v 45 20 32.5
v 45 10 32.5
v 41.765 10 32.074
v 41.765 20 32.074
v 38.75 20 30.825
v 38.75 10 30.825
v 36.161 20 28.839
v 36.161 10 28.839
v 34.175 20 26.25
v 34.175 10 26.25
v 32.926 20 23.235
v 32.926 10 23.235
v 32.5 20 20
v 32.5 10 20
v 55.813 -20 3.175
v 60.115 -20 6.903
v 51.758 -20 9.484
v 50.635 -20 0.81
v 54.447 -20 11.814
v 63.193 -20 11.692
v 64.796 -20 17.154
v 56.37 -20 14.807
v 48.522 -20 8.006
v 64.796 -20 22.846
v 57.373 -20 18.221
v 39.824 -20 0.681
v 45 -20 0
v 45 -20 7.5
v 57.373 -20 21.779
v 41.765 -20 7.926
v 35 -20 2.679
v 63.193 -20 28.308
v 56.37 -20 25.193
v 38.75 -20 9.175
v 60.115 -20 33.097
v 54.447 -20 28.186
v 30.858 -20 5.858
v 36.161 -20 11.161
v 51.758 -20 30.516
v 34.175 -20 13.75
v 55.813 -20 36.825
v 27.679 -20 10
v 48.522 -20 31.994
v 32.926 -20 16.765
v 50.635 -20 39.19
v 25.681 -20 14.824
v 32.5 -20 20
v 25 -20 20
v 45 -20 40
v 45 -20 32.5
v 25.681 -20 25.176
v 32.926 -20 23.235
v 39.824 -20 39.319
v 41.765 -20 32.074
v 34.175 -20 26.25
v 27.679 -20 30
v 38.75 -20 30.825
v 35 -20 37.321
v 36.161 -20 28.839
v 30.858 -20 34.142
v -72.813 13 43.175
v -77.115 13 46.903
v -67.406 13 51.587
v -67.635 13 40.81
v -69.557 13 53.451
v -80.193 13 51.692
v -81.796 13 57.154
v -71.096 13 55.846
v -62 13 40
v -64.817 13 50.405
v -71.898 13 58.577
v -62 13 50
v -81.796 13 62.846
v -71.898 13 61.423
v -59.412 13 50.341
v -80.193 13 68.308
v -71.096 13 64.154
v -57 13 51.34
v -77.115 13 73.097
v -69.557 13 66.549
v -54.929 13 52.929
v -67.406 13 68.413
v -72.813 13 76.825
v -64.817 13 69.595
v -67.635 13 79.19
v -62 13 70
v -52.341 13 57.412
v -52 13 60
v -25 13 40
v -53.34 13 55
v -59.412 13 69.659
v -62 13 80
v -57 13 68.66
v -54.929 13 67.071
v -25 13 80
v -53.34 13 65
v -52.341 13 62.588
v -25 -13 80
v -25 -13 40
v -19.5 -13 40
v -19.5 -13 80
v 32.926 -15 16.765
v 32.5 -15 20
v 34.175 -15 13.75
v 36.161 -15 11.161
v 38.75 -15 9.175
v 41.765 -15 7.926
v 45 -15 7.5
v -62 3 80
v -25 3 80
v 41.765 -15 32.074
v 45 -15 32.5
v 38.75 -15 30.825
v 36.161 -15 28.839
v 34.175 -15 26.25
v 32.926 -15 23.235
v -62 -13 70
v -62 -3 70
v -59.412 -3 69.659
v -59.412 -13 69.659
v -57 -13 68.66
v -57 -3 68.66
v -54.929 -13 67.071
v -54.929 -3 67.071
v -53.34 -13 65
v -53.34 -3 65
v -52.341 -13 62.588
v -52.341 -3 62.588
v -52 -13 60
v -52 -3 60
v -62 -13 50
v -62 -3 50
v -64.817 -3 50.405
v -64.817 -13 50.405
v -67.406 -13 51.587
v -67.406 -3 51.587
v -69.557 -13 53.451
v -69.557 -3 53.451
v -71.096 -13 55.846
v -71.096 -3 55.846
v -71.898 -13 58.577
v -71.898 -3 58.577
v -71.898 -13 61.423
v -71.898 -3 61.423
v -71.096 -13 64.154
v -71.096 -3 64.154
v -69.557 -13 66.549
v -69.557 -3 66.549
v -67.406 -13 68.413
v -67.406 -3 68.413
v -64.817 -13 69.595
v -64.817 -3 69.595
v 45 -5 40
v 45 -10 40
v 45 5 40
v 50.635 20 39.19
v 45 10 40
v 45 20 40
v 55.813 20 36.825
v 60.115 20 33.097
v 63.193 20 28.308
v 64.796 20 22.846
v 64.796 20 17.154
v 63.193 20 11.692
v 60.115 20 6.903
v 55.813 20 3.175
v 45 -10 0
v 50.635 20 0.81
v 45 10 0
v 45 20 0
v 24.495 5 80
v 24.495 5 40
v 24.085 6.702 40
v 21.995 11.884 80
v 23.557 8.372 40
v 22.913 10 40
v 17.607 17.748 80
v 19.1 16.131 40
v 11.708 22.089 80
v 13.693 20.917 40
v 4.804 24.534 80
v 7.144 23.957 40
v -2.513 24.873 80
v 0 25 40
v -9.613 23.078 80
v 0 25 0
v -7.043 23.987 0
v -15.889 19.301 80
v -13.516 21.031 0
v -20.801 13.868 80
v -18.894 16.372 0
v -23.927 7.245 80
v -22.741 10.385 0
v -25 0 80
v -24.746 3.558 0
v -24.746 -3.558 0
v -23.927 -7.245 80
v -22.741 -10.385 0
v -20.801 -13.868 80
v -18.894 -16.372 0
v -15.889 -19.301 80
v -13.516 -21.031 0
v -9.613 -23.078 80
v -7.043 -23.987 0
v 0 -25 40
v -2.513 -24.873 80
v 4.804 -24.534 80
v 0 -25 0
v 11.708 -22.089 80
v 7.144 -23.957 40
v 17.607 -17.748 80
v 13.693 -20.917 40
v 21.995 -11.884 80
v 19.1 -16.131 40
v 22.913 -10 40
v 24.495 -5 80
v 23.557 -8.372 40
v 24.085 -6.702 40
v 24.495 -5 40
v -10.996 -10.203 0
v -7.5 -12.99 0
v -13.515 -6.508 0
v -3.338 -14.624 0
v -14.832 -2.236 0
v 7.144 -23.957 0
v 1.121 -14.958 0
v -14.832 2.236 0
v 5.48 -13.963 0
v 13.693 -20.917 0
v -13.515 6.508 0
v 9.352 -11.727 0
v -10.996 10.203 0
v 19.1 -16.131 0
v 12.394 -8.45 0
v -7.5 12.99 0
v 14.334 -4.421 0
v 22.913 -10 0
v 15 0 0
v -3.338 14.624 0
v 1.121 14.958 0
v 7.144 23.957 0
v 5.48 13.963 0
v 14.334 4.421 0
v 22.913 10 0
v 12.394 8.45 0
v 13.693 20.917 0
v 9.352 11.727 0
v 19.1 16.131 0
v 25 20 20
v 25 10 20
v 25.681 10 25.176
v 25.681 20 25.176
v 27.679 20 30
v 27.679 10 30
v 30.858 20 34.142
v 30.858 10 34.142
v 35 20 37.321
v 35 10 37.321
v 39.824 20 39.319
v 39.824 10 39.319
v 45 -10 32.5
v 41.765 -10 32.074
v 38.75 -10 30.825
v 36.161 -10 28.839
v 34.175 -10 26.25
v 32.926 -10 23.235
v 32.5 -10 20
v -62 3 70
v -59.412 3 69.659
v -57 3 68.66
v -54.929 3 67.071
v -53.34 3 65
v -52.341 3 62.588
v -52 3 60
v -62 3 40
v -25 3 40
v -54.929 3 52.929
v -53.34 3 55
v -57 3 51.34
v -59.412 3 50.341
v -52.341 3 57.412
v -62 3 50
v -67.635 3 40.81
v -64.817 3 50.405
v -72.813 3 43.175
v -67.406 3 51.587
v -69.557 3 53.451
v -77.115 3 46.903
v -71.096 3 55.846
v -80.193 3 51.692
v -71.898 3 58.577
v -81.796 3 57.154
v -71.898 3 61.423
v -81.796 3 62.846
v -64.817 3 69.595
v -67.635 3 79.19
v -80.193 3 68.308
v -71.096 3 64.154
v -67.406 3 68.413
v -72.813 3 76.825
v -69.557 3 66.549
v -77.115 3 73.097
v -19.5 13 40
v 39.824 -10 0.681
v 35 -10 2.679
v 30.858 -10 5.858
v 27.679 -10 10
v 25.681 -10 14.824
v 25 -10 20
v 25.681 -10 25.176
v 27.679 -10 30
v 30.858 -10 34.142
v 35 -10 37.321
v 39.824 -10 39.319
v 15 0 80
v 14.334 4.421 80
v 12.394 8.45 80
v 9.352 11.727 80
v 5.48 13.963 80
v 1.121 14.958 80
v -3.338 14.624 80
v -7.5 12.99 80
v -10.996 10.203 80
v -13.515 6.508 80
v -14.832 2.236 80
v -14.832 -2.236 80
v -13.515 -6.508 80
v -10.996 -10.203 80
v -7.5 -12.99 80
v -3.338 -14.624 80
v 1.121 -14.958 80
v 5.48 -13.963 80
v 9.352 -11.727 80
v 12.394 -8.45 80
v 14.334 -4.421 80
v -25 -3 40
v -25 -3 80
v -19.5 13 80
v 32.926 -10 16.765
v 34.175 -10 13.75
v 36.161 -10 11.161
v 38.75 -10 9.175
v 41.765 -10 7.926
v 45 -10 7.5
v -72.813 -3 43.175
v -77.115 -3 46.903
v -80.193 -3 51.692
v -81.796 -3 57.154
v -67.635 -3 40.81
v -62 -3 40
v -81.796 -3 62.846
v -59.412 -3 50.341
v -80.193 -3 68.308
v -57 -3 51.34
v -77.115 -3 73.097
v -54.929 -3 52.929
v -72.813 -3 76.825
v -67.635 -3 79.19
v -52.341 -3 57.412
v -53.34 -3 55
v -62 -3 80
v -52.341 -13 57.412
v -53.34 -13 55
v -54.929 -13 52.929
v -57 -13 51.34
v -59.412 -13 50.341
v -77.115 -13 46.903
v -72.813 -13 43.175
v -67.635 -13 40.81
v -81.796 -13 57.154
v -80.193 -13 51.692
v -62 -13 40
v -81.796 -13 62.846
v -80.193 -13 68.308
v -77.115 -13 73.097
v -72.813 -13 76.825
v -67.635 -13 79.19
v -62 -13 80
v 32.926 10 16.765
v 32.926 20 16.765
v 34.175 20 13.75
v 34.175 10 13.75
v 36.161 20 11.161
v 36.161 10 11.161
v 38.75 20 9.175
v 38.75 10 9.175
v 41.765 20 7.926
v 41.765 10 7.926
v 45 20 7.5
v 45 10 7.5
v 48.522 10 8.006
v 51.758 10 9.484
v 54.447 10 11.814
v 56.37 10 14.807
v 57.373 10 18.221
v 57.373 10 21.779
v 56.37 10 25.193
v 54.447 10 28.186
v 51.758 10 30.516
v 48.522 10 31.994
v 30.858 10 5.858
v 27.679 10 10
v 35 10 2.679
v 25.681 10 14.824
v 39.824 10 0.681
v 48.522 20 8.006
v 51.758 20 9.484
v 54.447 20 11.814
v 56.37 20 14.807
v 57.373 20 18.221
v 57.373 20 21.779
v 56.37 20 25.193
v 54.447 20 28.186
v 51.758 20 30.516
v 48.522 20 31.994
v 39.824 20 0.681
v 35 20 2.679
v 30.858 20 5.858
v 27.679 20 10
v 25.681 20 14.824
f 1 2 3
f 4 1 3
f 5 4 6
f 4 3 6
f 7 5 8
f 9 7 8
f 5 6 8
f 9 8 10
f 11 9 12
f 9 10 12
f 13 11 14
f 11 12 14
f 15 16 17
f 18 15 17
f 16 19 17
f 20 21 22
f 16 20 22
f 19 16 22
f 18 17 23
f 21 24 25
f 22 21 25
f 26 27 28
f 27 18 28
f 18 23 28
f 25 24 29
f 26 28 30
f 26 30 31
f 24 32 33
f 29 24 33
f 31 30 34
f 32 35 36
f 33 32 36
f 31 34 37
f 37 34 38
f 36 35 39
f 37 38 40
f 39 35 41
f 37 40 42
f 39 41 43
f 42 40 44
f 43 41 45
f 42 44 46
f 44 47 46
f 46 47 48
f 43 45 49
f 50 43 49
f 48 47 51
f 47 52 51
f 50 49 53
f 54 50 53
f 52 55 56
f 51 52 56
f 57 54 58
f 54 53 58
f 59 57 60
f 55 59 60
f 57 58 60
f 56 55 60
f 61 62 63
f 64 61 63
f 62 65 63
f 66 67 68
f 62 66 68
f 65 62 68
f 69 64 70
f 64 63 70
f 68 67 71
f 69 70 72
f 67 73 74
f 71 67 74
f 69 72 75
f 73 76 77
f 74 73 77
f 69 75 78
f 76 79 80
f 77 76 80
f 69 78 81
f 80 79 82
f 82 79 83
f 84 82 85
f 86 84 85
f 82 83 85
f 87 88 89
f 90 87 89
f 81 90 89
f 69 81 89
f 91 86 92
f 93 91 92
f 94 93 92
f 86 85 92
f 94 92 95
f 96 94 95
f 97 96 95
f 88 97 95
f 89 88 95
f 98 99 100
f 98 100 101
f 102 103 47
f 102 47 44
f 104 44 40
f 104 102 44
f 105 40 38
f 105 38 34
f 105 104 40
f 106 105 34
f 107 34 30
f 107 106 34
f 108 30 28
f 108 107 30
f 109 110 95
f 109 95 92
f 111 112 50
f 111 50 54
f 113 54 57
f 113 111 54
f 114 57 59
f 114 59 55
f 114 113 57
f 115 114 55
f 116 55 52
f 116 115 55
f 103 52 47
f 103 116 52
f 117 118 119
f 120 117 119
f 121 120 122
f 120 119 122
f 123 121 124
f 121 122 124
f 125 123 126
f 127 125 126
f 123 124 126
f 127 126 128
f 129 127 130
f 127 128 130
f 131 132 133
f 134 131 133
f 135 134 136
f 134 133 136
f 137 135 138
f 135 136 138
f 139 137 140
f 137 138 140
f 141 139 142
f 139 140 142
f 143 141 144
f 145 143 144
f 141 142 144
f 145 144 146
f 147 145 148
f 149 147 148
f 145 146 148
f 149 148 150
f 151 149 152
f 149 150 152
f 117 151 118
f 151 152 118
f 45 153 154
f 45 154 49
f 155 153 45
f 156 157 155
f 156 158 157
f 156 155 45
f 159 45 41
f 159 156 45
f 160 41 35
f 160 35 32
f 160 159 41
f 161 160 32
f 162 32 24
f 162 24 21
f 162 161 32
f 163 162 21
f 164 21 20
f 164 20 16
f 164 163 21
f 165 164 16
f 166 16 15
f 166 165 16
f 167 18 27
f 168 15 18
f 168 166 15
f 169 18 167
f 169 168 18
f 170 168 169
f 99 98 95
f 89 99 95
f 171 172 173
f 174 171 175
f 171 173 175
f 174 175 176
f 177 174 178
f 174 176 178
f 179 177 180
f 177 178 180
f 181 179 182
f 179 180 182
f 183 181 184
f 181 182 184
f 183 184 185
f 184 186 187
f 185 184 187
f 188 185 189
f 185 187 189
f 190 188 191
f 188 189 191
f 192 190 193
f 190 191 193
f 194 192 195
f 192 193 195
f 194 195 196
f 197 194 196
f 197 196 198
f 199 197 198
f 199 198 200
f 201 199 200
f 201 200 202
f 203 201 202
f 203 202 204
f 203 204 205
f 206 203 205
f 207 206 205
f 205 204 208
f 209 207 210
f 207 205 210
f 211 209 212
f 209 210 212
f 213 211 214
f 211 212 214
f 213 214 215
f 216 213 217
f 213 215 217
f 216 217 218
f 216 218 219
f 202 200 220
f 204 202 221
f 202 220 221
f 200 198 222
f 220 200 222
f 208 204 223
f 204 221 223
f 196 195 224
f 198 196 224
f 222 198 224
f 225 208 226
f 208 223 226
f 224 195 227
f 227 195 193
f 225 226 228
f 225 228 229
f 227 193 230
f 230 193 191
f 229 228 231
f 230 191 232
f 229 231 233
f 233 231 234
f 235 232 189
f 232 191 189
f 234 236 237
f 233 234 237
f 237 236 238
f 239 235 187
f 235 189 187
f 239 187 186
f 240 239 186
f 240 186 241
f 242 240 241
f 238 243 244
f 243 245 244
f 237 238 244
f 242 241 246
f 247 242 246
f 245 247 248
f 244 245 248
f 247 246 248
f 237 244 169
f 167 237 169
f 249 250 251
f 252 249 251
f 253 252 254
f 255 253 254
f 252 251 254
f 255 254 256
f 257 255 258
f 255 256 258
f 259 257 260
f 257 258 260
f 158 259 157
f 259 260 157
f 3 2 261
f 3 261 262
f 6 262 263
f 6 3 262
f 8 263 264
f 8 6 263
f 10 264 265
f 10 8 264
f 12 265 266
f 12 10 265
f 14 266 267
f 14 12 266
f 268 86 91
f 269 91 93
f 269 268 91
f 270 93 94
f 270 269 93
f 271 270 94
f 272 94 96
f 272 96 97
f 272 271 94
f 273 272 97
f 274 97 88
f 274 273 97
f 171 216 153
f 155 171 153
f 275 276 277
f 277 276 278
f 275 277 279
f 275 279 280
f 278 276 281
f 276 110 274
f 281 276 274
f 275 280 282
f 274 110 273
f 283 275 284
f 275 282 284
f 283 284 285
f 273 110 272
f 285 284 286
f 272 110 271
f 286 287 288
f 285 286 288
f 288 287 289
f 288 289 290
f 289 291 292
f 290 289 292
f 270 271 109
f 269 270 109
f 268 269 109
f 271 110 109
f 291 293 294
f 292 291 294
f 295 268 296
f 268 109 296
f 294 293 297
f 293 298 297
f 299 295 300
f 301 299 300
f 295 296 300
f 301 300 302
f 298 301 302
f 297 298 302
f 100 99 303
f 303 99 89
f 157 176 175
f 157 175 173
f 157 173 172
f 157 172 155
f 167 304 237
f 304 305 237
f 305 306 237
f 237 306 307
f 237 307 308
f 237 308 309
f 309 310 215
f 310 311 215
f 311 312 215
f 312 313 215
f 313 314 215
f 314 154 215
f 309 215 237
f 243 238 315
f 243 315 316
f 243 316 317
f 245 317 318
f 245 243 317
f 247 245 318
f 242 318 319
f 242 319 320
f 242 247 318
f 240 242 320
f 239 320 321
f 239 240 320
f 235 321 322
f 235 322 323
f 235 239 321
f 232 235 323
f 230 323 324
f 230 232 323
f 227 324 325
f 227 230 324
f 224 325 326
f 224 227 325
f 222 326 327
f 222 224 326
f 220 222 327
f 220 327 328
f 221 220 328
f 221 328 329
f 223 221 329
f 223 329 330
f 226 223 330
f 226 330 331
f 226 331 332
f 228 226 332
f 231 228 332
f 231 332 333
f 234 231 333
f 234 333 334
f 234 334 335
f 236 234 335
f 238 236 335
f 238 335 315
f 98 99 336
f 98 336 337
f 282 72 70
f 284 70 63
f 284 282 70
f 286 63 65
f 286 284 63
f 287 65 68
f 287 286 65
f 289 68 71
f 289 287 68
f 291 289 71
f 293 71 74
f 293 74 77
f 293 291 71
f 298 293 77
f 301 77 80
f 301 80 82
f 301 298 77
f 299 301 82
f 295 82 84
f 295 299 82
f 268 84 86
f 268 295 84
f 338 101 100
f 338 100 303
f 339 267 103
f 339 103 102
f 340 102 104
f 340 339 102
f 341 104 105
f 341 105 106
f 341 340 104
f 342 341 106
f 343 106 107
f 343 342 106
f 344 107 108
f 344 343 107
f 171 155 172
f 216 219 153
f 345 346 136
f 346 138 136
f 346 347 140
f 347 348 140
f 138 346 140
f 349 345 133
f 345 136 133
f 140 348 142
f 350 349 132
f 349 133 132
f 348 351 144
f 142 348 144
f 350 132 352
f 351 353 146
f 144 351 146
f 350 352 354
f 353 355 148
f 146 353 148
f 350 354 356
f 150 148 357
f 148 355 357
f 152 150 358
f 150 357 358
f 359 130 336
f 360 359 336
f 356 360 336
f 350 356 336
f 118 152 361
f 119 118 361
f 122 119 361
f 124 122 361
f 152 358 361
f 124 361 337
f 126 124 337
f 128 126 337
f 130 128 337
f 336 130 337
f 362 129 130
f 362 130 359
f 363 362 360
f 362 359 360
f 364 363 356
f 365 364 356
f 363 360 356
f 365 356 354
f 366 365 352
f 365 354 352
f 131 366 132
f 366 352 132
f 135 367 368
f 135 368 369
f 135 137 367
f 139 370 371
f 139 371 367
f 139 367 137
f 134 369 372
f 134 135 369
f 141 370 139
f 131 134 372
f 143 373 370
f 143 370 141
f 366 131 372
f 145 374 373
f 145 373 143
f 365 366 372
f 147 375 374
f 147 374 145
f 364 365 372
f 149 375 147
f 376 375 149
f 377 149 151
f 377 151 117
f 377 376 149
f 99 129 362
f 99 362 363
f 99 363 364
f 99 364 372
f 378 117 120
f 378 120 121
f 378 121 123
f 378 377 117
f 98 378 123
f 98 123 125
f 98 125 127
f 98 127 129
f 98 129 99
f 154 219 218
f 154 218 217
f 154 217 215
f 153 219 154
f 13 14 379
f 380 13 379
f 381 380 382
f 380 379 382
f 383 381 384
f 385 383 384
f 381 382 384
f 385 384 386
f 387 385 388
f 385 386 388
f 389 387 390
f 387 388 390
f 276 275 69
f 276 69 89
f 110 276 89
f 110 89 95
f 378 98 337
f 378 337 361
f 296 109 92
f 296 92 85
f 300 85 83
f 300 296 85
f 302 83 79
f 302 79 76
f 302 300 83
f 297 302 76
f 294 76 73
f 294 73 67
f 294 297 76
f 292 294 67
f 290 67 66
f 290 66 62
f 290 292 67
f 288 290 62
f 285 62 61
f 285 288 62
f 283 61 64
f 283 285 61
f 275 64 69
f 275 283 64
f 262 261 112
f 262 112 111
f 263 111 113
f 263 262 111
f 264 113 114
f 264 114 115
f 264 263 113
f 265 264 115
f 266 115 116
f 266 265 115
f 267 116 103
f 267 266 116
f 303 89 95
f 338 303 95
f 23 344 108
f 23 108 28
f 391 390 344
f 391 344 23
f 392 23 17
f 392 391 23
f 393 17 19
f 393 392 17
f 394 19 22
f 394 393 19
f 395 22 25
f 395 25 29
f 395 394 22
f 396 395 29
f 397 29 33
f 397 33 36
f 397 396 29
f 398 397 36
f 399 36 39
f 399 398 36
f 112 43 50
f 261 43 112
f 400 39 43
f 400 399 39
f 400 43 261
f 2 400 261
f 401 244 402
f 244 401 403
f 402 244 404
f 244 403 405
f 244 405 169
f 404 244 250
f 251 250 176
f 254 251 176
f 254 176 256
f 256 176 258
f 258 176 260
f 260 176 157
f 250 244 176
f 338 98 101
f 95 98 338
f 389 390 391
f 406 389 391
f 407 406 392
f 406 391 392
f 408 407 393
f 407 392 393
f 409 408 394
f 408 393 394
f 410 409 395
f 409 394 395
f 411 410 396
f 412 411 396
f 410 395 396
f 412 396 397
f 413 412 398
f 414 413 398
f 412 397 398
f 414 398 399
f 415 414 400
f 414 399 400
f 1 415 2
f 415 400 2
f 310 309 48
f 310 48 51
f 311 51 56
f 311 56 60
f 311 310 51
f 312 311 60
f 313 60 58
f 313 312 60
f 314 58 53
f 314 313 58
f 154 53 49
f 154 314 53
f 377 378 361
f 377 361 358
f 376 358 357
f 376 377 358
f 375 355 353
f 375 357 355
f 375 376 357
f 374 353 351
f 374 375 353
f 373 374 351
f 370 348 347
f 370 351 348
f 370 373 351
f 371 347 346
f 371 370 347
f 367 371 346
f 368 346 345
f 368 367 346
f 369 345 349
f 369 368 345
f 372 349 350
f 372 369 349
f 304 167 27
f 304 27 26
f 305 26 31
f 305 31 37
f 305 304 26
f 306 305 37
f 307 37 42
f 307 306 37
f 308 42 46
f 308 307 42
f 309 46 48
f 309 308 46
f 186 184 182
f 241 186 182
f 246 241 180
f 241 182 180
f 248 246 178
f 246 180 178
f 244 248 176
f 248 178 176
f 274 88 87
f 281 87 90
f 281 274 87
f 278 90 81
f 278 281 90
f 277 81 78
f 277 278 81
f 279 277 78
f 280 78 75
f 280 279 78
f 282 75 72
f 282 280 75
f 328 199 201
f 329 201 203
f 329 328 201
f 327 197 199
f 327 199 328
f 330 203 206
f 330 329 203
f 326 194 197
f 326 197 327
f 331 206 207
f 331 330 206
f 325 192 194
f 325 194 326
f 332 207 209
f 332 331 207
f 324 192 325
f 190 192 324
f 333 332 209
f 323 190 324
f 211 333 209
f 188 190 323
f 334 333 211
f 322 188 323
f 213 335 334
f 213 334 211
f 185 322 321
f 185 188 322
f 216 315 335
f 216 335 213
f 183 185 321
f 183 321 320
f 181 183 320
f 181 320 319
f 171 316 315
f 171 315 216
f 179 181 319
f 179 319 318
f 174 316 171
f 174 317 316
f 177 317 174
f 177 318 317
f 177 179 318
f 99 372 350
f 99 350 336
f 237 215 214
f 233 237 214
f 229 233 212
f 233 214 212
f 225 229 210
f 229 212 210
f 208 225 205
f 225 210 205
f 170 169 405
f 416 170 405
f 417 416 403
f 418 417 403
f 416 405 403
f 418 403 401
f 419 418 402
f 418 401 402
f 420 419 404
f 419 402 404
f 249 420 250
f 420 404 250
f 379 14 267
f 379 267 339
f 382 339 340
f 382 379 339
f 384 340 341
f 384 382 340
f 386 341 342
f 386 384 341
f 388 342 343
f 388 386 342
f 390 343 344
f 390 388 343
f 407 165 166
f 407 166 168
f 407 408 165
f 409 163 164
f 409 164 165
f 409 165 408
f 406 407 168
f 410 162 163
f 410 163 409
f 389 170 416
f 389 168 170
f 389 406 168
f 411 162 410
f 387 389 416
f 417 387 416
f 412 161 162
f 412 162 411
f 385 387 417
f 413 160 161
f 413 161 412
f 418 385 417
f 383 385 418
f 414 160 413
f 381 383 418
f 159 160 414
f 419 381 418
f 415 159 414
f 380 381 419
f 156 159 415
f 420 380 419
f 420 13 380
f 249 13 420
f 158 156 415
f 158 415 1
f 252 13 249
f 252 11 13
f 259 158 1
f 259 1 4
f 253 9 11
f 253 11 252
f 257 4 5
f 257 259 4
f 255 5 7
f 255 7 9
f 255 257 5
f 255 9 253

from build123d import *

# Parameters (mm, degrees)
F0_R           = 25
F0_R_2         = 15
F1_DEPTH       = 80
F4_DEPTH       = 40
F6_DEPTH       = 25
F7_R           = 15
F8_DEPTH       = 40
F10_DEPTH      = 49.5
F12_DEPTH      = 10
F12_DEPTH_BACK = 30
F13_DEPTH      = 25
F17_DEPTH      = 13
F17_DEPTH_BACK = 13
F18_W          = 26
F18_H          = 40
F19_DEPTH      = 5.5
F20_W          = 37
F20_H          = 3
F21_DEPTH      = 156.4


with BuildPart() as f1:
    # F0 (on Top) → F1 (new body)
    with BuildSketch(Plane.XY):
        Circle(F0_R)
        Circle(F0_R_2, mode=Mode.SUBTRACT)
    extrude(amount=F1_DEPTH)

    # F3 (on face) → F4 (join)
    with BuildSketch(Plane.XY.offset(80)):
        with BuildLine():
            ThreePointArc((24.4948974278, 5), (24.8734038251, 2.5127240501), (25, 0))
            Line((25, 0), (45, 0))
            Line((45, 0), (45, 5))
            Line((45, 5), (24.4948974278, 5))
        make_face()
        with BuildLine():
            Line((45, 0), (25, 0))
            ThreePointArc((25, 0), (24.8734038251, -2.5127240501), (24.4948974278, -5))
            Line((24.4948974278, -5), (45, -5))
            Line((45, -5), (45, 0))
        make_face()
    extrude(amount=-F4_DEPTH)

    # F5 (on face) → F6 (cut)
    with BuildSketch(Plane.XZ.offset(5)):
        Polygon((45, 80), (24.4948974278, 80), (45, 40), align=None)
    extrude(amount=-F6_DEPTH, mode=Mode.SUBTRACT)

    # F7 (on Top) → F8 (join)
    with BuildSketch(Plane.XY):
        with BuildLine():
            ThreePointArc((0, -25), (17.6776695297, -17.6776695297), (25, 0))
            ThreePointArc((25, 0), (17.6776695297, 17.6776695297), (0, 25))
            ThreePointArc((0, 25), (-25, 0), (0, -25))
        make_face()
        Circle(F7_R, mode=Mode.SUBTRACT)
        with BuildLine():
            ThreePointArc((0, 25), (17.6776695297, 17.6776695297), (25, 0))
            ThreePointArc((25, 0), (17.6776695297, -17.6776695297), (0, -25))
            Line((0, -25), (57, -25))
            Line((57, -25), (57, 25))
            Line((57, 25), (0, 25))
        make_face()
    extrude(amount=F8_DEPTH)

    # F9 (on face) → F10 (cut)
    with BuildSketch(Plane.XY.offset(40)):
        with BuildLine():
            Line((45, 5), (45, 0))
            Line((45, 0), (45, -5))
            Line((45, -5), (45, -10))
            Line((45, -10), (22.9128784748, -10))
            ThreePointArc((22.9128784748, -10), (13.6930639376, -20.9165006634), (0, -25))
            Line((0, -25), (57, -25))
            Line((57, -25), (57, 25))
            Line((57, 25), (0, 25))
            ThreePointArc((0, 25), (13.6930639376, 20.9165006634), (22.9128784748, 10))
            Line((22.9128784748, 10), (24.4948974278, 10))
            Line((24.4948974278, 10), (45, 10))
            Line((45, 10), (45, 5))
        make_face()
    extrude(amount=-F10_DEPTH, mode=Mode.SUBTRACT)

    # F11 (on face) → F12 (join, two sides)
    with BuildSketch(Plane(origin=(0, 10, 0), x_dir=(-1, 0, 0), z_dir=(0, 1, 0))) as f12_sk:
        with BuildLine():
            ThreePointArc((-45, 0), (-30.8578643763, 5.8578643763), (-25, 20))
            ThreePointArc((-25, 20), (-30.8578643763, 34.1421356237), (-45, 40))
            Line((-45, 40), (-45, 32.5))
            ThreePointArc((-45, 32.5), (-36.1611652352, 28.8388347648), (-32.5, 20))
            ThreePointArc((-32.5, 20), (-36.1611652352, 11.1611652352), (-45, 7.5))
            Line((-45, 7.5), (-45, 0))
        make_face()
        with BuildLine():
            Line((-45, 32.5), (-45, 40))
            ThreePointArc((-45, 40), (-65, 20), (-45, 0))
            Line((-45, 0), (-45, 7.5))
            ThreePointArc((-45, 7.5), (-57.5, 20), (-45, 32.5))
        make_face()
    extrude(amount=F12_DEPTH)
    extrude(f12_sk.sketch, amount=-F12_DEPTH_BACK)

    # F13 (cut): a face of the model
    f13_faces = [f1.faces().sort_by_distance(p)[0] for p in [
        (39.6948352303, 10, 20),
    ]]
    extrude(f13_faces, amount=-F13_DEPTH, mode=Mode.SUBTRACT)


with BuildPart() as f17:
    # F16 (on Front) → F17 (new body, two sides)
    with BuildSketch(Plane.XZ) as f17_sk:
        with BuildLine():
            Line((-25, 40), (-25, 80))
            Line((-25, 80), (-62, 80))
            ThreePointArc((-62, 80), (-47.8578643763, 74.1421356237), (-42, 60))
            ThreePointArc((-42, 60), (-47.8578643763, 45.8578643763), (-62, 40))
            Line((-62, 40), (-25, 40))
        make_face()
        with BuildLine():
            ThreePointArc((-42, 60), (-47.8578643763, 74.1421356237), (-62, 80))
            Line((-62, 80), (-62, 70))
            ThreePointArc((-62, 70), (-54.9289321881, 67.0710678119), (-52, 60))
            ThreePointArc((-52, 60), (-54.9289321881, 52.9289321881), (-62, 50))
            Line((-62, 50), (-62, 40))
            ThreePointArc((-62, 40), (-47.8578643763, 45.8578643763), (-42, 60))
        make_face()
        with BuildLine():
            Line((-62, 70), (-62, 80))
            ThreePointArc((-62, 80), (-82, 60), (-62, 40))
            Line((-62, 40), (-62, 50))
            ThreePointArc((-62, 50), (-72, 60), (-62, 70))
        make_face()
    extrude(amount=F17_DEPTH)
    extrude(f17_sk.sketch, amount=-F17_DEPTH_BACK)

    # F20 (on face) → F21 (cut)
    with BuildSketch(Plane.XY.offset(80)):
        with Locations((-43.5, 1.5)):
            Rectangle(F20_W, F20_H)
        with Locations((-43.5, -1.5)):
            Rectangle(F20_W, F20_H)
        Polygon((-62, -3), (-62, 0), (-62, 3), (-82, 3), (-82, -3), align=None)
    extrude(amount=-F21_DEPTH, mode=Mode.SUBTRACT)


with BuildPart() as f19:
    # F18 (on face) → F19 (new body)
    with BuildSketch(Plane.YZ.offset(-25)):
        with Locations((0, 60)):
            Rectangle(F18_W, F18_H)
    extrude(amount=F19_DEPTH)


solid = Compound([f1.part, f17.part, f19.part])
